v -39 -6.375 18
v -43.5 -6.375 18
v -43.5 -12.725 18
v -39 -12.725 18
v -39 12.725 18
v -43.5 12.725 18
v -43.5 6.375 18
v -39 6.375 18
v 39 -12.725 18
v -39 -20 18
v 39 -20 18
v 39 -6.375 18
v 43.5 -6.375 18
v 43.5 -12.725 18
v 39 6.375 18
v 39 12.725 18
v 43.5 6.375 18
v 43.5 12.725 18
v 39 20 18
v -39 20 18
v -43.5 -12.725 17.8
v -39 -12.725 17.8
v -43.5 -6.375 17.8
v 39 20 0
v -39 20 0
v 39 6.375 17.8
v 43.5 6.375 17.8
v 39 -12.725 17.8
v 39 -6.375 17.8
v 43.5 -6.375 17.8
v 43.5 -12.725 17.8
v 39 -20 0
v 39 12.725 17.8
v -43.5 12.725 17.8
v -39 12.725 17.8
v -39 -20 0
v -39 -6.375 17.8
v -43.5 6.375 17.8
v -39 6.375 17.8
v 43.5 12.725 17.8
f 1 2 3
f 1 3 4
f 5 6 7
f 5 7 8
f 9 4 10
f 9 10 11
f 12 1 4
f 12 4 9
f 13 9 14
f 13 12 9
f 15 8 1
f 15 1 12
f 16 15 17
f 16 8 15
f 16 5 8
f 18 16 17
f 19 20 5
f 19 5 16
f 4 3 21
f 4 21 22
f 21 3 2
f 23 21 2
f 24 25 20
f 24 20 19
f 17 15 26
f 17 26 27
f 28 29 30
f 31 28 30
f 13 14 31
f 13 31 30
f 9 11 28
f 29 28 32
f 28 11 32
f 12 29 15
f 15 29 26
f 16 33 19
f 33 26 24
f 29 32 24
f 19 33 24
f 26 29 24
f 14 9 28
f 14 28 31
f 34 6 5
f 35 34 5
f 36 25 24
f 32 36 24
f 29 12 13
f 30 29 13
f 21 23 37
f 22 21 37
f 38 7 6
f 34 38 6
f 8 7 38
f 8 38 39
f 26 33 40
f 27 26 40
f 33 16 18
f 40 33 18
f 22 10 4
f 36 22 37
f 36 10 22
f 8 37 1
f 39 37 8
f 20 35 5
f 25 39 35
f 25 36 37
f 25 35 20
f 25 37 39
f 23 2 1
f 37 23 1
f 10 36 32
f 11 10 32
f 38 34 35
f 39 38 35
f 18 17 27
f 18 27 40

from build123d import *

# Parameters (mm, degrees)
SKETCH_1_W      = 78
SKETCH_1_H      = 40
EXTRUDE_1_DEPTH = 18
SKETCH_2_W      = 4.5
SKETCH_2_H      = 6.35
EXTRUDE_2_DEPTH = 0.2


with BuildPart() as part:
    # 草图1 → 凸台-拉伸1 (new body)
    with BuildSketch(Plane.XY):
        Rectangle(SKETCH_1_W, SKETCH_1_H)
    extrude(amount=EXTRUDE_1_DEPTH)

    # 草图2 → 凸台-拉伸2 (add)
    with BuildSketch(Plane.XY.offset(18)):
        with Locations((-41.25, 9.55)):
            Rectangle(SKETCH_2_W, SKETCH_2_H)
        with Locations((-41.25, -9.55)):
            Rectangle(SKETCH_2_W, SKETCH_2_H)
        with Locations((41.25, 9.55)):
            Rectangle(SKETCH_2_W, SKETCH_2_H)
        with Locations((41.25, -9.55)):
            Rectangle(SKETCH_2_W, SKETCH_2_H)
    extrude(amount=-EXTRUDE_2_DEPTH)


solid = part.part
